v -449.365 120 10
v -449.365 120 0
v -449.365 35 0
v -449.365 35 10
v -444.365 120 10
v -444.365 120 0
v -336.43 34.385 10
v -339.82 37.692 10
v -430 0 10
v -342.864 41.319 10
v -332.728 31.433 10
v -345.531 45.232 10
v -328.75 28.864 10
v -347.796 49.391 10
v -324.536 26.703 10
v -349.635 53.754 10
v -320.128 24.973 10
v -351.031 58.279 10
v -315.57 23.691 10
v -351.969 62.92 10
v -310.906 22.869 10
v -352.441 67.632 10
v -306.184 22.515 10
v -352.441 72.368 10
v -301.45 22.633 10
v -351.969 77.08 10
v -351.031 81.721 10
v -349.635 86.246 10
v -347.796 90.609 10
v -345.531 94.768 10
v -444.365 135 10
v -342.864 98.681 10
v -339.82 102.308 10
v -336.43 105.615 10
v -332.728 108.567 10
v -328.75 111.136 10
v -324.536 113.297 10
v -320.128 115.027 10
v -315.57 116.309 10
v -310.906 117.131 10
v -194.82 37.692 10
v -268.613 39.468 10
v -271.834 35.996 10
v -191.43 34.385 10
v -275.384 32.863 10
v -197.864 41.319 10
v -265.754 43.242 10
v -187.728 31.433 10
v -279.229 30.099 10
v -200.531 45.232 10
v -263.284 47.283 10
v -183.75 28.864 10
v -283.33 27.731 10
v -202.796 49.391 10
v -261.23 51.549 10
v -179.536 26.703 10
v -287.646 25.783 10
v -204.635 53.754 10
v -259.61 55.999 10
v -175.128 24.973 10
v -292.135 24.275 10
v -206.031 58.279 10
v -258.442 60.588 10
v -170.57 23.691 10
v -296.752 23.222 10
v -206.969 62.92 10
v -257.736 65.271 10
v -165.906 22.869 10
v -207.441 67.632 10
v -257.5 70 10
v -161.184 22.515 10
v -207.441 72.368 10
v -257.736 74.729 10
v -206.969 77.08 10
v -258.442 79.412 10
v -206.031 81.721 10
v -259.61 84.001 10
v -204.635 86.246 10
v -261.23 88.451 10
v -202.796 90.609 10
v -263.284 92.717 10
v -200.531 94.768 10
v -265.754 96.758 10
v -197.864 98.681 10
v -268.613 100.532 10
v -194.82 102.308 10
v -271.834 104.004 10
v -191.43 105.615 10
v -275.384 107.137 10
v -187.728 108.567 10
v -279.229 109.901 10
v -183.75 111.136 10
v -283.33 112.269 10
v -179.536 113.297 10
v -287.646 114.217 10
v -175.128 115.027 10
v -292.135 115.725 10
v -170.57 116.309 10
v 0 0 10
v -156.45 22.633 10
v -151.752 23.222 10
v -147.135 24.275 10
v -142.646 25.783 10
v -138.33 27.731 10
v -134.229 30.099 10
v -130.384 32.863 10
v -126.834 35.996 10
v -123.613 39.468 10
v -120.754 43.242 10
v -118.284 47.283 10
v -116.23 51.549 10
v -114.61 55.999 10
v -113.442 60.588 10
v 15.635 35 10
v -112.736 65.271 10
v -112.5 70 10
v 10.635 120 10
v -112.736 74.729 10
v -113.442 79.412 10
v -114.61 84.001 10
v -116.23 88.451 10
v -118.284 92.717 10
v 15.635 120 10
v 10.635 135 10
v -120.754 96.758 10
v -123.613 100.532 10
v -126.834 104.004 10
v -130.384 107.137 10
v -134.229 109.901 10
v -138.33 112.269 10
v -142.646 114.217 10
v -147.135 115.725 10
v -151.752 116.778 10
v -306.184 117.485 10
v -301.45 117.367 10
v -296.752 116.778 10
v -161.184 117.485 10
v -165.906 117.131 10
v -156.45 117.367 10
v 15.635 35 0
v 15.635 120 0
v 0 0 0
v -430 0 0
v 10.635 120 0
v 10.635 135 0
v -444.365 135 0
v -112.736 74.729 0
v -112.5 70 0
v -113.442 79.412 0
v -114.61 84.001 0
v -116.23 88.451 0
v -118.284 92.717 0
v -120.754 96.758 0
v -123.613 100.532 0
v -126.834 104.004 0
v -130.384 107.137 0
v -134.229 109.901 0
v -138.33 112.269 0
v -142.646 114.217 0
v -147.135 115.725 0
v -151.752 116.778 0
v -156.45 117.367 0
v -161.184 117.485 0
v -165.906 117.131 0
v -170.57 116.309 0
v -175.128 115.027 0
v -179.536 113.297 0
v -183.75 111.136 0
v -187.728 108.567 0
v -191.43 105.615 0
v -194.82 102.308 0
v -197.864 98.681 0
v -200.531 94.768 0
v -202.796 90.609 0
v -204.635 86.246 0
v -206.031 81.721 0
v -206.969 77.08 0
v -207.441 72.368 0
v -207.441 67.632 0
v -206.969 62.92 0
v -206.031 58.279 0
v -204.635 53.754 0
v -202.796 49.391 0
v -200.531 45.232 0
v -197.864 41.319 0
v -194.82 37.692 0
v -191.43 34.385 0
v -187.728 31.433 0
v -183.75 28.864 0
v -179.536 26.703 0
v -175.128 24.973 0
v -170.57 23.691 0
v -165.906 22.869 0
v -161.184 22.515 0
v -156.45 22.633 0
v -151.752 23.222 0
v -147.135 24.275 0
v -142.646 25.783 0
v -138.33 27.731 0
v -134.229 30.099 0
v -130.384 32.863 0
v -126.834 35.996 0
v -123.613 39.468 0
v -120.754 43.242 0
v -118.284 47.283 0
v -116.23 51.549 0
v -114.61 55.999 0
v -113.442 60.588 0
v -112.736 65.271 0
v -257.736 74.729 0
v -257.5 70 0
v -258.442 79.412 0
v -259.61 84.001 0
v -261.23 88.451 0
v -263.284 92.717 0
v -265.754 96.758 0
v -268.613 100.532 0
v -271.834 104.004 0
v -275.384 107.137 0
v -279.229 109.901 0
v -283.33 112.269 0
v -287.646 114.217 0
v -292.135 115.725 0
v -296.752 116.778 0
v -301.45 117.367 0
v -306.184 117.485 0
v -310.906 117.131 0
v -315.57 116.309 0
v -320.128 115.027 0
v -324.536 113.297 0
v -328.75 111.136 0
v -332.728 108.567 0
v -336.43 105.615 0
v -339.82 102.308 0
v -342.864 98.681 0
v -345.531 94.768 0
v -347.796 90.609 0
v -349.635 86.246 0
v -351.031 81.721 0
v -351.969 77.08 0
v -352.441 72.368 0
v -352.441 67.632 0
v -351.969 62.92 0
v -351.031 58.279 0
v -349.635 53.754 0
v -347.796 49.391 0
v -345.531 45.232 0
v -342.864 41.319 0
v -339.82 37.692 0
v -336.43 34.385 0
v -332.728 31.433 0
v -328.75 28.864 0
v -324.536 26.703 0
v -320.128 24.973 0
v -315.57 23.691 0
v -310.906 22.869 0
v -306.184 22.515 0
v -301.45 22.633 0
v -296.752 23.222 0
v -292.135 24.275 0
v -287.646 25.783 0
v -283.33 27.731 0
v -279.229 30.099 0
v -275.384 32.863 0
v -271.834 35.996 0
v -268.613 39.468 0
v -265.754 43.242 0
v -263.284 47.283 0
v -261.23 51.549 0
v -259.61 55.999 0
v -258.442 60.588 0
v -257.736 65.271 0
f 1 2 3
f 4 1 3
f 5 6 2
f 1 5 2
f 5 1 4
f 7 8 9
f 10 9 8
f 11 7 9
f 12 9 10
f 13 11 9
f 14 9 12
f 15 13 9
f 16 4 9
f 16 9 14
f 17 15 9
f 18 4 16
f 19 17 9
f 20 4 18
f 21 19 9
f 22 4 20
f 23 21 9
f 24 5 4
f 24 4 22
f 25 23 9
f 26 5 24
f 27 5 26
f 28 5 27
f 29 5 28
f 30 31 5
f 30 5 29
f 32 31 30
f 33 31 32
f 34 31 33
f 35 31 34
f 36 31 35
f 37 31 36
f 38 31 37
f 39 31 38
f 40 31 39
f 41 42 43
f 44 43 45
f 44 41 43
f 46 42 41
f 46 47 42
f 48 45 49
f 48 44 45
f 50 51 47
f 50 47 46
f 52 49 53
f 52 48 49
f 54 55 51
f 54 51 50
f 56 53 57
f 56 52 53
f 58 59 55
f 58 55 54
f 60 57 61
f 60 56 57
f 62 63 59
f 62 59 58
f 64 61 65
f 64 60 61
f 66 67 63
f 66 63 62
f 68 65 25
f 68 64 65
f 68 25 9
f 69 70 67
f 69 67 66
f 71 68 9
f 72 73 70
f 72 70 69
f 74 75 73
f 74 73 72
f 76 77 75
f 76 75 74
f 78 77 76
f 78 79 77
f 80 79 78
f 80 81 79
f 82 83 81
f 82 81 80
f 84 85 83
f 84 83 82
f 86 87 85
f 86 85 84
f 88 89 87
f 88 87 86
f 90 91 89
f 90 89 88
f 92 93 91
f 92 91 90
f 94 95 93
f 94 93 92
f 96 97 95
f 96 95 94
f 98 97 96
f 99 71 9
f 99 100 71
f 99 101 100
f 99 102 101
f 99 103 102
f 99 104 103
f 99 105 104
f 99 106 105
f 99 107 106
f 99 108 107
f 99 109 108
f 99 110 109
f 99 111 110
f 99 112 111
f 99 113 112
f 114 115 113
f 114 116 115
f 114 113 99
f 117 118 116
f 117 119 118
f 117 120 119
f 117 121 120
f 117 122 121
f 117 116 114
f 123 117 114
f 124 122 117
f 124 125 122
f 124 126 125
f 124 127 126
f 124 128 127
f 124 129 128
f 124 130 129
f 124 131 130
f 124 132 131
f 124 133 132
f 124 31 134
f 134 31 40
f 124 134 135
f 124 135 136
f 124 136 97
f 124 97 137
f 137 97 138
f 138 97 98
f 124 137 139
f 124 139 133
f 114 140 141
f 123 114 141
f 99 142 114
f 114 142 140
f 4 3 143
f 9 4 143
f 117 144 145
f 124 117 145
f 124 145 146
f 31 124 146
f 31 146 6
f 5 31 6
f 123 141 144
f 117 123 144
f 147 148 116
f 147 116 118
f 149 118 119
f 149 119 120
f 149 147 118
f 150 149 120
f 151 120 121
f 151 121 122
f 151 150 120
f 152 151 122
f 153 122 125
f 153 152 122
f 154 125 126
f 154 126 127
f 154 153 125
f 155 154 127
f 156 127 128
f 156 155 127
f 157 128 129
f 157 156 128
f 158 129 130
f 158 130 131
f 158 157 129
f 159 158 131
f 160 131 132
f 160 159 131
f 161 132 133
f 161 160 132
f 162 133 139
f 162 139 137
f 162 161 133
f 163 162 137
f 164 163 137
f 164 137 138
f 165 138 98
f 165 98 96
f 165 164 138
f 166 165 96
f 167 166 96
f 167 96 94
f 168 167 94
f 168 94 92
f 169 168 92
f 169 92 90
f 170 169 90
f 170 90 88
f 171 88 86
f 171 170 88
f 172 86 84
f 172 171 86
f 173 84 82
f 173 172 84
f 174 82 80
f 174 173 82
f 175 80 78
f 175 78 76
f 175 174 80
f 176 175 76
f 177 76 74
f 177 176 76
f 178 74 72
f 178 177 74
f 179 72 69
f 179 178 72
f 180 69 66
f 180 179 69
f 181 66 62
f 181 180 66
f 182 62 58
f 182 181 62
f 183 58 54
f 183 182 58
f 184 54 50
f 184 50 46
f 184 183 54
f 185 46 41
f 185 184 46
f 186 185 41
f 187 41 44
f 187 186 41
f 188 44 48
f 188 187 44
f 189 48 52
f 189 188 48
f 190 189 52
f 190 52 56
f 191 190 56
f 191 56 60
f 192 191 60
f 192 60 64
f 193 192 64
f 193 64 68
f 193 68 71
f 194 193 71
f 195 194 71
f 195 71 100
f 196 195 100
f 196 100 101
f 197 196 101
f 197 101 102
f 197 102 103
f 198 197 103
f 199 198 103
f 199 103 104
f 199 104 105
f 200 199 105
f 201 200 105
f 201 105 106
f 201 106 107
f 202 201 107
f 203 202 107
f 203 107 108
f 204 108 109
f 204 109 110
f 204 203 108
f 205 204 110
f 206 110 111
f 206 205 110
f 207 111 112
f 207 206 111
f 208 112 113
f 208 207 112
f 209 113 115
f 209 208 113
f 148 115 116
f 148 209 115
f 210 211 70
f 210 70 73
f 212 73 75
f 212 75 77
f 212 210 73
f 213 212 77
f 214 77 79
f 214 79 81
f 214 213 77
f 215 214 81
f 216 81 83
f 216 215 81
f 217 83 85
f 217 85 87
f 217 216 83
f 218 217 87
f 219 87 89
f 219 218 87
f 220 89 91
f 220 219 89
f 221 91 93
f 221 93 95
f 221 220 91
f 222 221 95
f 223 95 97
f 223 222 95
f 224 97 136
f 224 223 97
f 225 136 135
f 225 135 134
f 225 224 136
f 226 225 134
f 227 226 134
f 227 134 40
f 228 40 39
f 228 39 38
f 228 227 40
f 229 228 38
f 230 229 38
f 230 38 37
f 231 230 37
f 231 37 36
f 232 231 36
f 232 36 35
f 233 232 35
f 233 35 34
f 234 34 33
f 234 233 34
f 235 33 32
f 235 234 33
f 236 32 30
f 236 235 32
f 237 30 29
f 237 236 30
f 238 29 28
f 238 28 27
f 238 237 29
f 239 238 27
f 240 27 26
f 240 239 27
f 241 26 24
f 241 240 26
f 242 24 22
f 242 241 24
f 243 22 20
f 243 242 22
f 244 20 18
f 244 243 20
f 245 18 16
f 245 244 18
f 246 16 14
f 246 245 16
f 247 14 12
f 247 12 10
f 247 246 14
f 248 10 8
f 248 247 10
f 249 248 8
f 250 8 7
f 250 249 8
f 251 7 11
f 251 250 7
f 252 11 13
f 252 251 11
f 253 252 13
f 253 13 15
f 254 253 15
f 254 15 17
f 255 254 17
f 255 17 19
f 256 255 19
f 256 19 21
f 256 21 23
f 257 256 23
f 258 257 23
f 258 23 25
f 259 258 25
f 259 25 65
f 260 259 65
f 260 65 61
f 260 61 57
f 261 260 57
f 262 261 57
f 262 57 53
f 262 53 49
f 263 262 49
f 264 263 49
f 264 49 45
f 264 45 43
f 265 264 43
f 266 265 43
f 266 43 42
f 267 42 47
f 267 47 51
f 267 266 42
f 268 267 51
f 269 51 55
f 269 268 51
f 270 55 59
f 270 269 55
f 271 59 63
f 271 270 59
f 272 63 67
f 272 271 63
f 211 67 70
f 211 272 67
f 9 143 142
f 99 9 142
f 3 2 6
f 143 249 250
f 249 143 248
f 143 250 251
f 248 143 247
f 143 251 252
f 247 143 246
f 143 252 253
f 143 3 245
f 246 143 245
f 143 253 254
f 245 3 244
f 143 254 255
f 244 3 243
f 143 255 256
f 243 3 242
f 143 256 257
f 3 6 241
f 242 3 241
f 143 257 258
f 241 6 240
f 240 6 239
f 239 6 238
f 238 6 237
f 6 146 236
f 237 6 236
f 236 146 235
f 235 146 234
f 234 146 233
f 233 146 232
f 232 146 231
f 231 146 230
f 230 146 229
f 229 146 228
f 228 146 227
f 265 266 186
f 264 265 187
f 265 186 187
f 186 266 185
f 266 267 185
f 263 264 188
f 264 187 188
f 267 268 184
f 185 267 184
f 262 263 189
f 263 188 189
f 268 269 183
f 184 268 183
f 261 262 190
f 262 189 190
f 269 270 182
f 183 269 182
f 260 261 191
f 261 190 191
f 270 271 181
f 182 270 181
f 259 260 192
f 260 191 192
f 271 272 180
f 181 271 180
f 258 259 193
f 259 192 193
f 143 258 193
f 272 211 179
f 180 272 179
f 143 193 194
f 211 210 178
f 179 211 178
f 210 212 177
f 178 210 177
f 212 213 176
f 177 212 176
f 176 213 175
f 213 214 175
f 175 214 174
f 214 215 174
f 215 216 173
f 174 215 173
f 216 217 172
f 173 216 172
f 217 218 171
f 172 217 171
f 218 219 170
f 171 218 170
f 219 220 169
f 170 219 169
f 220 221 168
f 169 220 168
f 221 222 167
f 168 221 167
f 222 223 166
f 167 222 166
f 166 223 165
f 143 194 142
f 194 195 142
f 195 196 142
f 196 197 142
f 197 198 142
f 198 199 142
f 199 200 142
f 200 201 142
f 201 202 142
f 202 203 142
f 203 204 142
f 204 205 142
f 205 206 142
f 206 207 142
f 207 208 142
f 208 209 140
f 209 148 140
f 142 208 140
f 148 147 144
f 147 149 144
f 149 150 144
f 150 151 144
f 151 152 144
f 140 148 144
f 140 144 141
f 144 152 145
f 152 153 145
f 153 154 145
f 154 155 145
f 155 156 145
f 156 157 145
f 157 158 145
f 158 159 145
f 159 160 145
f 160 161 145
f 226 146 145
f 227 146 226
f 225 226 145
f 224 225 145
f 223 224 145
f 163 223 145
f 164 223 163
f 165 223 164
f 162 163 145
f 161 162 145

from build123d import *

# Parameters (mm, degrees)
SKETCH2_R           = 60
SKETCH2_R_2         = 47.5
BOSS_EXTRUDE2_DEPTH = 10


with BuildPart() as part:
    # Sketch2 → Boss-Extrude2 (new body)
    with BuildSketch(Plane.XY):
        Polygon((10.635083269, 120), (10.635083269, 135), (-444.364916731, 135), (-444.364916731, 120), (-449.364916731, 120), (-449.364916731, 35), (-430, 0), (0, 0), (15.635083269, 35), (15.635083269, 120), align=None)
        with Locations((-160, 70)):
            Circle(SKETCH2_R, mode=Mode.SUBTRACT)
        with Locations((-305, 70)):
            Circle(SKETCH2_R, mode=Mode.SUBTRACT)
        with Locations((-160, 70)):
            Circle(SKETCH2_R)
        with Locations((-160, 70)):
            Circle(SKETCH2_R_2, mode=Mode.SUBTRACT)
        with Locations((-305, 70)):
            Circle(SKETCH2_R)
        with Locations((-305, 70)):
            Circle(SKETCH2_R_2, mode=Mode.SUBTRACT)
    extrude(amount=BOSS_EXTRUDE2_DEPTH)


solid = part.part
